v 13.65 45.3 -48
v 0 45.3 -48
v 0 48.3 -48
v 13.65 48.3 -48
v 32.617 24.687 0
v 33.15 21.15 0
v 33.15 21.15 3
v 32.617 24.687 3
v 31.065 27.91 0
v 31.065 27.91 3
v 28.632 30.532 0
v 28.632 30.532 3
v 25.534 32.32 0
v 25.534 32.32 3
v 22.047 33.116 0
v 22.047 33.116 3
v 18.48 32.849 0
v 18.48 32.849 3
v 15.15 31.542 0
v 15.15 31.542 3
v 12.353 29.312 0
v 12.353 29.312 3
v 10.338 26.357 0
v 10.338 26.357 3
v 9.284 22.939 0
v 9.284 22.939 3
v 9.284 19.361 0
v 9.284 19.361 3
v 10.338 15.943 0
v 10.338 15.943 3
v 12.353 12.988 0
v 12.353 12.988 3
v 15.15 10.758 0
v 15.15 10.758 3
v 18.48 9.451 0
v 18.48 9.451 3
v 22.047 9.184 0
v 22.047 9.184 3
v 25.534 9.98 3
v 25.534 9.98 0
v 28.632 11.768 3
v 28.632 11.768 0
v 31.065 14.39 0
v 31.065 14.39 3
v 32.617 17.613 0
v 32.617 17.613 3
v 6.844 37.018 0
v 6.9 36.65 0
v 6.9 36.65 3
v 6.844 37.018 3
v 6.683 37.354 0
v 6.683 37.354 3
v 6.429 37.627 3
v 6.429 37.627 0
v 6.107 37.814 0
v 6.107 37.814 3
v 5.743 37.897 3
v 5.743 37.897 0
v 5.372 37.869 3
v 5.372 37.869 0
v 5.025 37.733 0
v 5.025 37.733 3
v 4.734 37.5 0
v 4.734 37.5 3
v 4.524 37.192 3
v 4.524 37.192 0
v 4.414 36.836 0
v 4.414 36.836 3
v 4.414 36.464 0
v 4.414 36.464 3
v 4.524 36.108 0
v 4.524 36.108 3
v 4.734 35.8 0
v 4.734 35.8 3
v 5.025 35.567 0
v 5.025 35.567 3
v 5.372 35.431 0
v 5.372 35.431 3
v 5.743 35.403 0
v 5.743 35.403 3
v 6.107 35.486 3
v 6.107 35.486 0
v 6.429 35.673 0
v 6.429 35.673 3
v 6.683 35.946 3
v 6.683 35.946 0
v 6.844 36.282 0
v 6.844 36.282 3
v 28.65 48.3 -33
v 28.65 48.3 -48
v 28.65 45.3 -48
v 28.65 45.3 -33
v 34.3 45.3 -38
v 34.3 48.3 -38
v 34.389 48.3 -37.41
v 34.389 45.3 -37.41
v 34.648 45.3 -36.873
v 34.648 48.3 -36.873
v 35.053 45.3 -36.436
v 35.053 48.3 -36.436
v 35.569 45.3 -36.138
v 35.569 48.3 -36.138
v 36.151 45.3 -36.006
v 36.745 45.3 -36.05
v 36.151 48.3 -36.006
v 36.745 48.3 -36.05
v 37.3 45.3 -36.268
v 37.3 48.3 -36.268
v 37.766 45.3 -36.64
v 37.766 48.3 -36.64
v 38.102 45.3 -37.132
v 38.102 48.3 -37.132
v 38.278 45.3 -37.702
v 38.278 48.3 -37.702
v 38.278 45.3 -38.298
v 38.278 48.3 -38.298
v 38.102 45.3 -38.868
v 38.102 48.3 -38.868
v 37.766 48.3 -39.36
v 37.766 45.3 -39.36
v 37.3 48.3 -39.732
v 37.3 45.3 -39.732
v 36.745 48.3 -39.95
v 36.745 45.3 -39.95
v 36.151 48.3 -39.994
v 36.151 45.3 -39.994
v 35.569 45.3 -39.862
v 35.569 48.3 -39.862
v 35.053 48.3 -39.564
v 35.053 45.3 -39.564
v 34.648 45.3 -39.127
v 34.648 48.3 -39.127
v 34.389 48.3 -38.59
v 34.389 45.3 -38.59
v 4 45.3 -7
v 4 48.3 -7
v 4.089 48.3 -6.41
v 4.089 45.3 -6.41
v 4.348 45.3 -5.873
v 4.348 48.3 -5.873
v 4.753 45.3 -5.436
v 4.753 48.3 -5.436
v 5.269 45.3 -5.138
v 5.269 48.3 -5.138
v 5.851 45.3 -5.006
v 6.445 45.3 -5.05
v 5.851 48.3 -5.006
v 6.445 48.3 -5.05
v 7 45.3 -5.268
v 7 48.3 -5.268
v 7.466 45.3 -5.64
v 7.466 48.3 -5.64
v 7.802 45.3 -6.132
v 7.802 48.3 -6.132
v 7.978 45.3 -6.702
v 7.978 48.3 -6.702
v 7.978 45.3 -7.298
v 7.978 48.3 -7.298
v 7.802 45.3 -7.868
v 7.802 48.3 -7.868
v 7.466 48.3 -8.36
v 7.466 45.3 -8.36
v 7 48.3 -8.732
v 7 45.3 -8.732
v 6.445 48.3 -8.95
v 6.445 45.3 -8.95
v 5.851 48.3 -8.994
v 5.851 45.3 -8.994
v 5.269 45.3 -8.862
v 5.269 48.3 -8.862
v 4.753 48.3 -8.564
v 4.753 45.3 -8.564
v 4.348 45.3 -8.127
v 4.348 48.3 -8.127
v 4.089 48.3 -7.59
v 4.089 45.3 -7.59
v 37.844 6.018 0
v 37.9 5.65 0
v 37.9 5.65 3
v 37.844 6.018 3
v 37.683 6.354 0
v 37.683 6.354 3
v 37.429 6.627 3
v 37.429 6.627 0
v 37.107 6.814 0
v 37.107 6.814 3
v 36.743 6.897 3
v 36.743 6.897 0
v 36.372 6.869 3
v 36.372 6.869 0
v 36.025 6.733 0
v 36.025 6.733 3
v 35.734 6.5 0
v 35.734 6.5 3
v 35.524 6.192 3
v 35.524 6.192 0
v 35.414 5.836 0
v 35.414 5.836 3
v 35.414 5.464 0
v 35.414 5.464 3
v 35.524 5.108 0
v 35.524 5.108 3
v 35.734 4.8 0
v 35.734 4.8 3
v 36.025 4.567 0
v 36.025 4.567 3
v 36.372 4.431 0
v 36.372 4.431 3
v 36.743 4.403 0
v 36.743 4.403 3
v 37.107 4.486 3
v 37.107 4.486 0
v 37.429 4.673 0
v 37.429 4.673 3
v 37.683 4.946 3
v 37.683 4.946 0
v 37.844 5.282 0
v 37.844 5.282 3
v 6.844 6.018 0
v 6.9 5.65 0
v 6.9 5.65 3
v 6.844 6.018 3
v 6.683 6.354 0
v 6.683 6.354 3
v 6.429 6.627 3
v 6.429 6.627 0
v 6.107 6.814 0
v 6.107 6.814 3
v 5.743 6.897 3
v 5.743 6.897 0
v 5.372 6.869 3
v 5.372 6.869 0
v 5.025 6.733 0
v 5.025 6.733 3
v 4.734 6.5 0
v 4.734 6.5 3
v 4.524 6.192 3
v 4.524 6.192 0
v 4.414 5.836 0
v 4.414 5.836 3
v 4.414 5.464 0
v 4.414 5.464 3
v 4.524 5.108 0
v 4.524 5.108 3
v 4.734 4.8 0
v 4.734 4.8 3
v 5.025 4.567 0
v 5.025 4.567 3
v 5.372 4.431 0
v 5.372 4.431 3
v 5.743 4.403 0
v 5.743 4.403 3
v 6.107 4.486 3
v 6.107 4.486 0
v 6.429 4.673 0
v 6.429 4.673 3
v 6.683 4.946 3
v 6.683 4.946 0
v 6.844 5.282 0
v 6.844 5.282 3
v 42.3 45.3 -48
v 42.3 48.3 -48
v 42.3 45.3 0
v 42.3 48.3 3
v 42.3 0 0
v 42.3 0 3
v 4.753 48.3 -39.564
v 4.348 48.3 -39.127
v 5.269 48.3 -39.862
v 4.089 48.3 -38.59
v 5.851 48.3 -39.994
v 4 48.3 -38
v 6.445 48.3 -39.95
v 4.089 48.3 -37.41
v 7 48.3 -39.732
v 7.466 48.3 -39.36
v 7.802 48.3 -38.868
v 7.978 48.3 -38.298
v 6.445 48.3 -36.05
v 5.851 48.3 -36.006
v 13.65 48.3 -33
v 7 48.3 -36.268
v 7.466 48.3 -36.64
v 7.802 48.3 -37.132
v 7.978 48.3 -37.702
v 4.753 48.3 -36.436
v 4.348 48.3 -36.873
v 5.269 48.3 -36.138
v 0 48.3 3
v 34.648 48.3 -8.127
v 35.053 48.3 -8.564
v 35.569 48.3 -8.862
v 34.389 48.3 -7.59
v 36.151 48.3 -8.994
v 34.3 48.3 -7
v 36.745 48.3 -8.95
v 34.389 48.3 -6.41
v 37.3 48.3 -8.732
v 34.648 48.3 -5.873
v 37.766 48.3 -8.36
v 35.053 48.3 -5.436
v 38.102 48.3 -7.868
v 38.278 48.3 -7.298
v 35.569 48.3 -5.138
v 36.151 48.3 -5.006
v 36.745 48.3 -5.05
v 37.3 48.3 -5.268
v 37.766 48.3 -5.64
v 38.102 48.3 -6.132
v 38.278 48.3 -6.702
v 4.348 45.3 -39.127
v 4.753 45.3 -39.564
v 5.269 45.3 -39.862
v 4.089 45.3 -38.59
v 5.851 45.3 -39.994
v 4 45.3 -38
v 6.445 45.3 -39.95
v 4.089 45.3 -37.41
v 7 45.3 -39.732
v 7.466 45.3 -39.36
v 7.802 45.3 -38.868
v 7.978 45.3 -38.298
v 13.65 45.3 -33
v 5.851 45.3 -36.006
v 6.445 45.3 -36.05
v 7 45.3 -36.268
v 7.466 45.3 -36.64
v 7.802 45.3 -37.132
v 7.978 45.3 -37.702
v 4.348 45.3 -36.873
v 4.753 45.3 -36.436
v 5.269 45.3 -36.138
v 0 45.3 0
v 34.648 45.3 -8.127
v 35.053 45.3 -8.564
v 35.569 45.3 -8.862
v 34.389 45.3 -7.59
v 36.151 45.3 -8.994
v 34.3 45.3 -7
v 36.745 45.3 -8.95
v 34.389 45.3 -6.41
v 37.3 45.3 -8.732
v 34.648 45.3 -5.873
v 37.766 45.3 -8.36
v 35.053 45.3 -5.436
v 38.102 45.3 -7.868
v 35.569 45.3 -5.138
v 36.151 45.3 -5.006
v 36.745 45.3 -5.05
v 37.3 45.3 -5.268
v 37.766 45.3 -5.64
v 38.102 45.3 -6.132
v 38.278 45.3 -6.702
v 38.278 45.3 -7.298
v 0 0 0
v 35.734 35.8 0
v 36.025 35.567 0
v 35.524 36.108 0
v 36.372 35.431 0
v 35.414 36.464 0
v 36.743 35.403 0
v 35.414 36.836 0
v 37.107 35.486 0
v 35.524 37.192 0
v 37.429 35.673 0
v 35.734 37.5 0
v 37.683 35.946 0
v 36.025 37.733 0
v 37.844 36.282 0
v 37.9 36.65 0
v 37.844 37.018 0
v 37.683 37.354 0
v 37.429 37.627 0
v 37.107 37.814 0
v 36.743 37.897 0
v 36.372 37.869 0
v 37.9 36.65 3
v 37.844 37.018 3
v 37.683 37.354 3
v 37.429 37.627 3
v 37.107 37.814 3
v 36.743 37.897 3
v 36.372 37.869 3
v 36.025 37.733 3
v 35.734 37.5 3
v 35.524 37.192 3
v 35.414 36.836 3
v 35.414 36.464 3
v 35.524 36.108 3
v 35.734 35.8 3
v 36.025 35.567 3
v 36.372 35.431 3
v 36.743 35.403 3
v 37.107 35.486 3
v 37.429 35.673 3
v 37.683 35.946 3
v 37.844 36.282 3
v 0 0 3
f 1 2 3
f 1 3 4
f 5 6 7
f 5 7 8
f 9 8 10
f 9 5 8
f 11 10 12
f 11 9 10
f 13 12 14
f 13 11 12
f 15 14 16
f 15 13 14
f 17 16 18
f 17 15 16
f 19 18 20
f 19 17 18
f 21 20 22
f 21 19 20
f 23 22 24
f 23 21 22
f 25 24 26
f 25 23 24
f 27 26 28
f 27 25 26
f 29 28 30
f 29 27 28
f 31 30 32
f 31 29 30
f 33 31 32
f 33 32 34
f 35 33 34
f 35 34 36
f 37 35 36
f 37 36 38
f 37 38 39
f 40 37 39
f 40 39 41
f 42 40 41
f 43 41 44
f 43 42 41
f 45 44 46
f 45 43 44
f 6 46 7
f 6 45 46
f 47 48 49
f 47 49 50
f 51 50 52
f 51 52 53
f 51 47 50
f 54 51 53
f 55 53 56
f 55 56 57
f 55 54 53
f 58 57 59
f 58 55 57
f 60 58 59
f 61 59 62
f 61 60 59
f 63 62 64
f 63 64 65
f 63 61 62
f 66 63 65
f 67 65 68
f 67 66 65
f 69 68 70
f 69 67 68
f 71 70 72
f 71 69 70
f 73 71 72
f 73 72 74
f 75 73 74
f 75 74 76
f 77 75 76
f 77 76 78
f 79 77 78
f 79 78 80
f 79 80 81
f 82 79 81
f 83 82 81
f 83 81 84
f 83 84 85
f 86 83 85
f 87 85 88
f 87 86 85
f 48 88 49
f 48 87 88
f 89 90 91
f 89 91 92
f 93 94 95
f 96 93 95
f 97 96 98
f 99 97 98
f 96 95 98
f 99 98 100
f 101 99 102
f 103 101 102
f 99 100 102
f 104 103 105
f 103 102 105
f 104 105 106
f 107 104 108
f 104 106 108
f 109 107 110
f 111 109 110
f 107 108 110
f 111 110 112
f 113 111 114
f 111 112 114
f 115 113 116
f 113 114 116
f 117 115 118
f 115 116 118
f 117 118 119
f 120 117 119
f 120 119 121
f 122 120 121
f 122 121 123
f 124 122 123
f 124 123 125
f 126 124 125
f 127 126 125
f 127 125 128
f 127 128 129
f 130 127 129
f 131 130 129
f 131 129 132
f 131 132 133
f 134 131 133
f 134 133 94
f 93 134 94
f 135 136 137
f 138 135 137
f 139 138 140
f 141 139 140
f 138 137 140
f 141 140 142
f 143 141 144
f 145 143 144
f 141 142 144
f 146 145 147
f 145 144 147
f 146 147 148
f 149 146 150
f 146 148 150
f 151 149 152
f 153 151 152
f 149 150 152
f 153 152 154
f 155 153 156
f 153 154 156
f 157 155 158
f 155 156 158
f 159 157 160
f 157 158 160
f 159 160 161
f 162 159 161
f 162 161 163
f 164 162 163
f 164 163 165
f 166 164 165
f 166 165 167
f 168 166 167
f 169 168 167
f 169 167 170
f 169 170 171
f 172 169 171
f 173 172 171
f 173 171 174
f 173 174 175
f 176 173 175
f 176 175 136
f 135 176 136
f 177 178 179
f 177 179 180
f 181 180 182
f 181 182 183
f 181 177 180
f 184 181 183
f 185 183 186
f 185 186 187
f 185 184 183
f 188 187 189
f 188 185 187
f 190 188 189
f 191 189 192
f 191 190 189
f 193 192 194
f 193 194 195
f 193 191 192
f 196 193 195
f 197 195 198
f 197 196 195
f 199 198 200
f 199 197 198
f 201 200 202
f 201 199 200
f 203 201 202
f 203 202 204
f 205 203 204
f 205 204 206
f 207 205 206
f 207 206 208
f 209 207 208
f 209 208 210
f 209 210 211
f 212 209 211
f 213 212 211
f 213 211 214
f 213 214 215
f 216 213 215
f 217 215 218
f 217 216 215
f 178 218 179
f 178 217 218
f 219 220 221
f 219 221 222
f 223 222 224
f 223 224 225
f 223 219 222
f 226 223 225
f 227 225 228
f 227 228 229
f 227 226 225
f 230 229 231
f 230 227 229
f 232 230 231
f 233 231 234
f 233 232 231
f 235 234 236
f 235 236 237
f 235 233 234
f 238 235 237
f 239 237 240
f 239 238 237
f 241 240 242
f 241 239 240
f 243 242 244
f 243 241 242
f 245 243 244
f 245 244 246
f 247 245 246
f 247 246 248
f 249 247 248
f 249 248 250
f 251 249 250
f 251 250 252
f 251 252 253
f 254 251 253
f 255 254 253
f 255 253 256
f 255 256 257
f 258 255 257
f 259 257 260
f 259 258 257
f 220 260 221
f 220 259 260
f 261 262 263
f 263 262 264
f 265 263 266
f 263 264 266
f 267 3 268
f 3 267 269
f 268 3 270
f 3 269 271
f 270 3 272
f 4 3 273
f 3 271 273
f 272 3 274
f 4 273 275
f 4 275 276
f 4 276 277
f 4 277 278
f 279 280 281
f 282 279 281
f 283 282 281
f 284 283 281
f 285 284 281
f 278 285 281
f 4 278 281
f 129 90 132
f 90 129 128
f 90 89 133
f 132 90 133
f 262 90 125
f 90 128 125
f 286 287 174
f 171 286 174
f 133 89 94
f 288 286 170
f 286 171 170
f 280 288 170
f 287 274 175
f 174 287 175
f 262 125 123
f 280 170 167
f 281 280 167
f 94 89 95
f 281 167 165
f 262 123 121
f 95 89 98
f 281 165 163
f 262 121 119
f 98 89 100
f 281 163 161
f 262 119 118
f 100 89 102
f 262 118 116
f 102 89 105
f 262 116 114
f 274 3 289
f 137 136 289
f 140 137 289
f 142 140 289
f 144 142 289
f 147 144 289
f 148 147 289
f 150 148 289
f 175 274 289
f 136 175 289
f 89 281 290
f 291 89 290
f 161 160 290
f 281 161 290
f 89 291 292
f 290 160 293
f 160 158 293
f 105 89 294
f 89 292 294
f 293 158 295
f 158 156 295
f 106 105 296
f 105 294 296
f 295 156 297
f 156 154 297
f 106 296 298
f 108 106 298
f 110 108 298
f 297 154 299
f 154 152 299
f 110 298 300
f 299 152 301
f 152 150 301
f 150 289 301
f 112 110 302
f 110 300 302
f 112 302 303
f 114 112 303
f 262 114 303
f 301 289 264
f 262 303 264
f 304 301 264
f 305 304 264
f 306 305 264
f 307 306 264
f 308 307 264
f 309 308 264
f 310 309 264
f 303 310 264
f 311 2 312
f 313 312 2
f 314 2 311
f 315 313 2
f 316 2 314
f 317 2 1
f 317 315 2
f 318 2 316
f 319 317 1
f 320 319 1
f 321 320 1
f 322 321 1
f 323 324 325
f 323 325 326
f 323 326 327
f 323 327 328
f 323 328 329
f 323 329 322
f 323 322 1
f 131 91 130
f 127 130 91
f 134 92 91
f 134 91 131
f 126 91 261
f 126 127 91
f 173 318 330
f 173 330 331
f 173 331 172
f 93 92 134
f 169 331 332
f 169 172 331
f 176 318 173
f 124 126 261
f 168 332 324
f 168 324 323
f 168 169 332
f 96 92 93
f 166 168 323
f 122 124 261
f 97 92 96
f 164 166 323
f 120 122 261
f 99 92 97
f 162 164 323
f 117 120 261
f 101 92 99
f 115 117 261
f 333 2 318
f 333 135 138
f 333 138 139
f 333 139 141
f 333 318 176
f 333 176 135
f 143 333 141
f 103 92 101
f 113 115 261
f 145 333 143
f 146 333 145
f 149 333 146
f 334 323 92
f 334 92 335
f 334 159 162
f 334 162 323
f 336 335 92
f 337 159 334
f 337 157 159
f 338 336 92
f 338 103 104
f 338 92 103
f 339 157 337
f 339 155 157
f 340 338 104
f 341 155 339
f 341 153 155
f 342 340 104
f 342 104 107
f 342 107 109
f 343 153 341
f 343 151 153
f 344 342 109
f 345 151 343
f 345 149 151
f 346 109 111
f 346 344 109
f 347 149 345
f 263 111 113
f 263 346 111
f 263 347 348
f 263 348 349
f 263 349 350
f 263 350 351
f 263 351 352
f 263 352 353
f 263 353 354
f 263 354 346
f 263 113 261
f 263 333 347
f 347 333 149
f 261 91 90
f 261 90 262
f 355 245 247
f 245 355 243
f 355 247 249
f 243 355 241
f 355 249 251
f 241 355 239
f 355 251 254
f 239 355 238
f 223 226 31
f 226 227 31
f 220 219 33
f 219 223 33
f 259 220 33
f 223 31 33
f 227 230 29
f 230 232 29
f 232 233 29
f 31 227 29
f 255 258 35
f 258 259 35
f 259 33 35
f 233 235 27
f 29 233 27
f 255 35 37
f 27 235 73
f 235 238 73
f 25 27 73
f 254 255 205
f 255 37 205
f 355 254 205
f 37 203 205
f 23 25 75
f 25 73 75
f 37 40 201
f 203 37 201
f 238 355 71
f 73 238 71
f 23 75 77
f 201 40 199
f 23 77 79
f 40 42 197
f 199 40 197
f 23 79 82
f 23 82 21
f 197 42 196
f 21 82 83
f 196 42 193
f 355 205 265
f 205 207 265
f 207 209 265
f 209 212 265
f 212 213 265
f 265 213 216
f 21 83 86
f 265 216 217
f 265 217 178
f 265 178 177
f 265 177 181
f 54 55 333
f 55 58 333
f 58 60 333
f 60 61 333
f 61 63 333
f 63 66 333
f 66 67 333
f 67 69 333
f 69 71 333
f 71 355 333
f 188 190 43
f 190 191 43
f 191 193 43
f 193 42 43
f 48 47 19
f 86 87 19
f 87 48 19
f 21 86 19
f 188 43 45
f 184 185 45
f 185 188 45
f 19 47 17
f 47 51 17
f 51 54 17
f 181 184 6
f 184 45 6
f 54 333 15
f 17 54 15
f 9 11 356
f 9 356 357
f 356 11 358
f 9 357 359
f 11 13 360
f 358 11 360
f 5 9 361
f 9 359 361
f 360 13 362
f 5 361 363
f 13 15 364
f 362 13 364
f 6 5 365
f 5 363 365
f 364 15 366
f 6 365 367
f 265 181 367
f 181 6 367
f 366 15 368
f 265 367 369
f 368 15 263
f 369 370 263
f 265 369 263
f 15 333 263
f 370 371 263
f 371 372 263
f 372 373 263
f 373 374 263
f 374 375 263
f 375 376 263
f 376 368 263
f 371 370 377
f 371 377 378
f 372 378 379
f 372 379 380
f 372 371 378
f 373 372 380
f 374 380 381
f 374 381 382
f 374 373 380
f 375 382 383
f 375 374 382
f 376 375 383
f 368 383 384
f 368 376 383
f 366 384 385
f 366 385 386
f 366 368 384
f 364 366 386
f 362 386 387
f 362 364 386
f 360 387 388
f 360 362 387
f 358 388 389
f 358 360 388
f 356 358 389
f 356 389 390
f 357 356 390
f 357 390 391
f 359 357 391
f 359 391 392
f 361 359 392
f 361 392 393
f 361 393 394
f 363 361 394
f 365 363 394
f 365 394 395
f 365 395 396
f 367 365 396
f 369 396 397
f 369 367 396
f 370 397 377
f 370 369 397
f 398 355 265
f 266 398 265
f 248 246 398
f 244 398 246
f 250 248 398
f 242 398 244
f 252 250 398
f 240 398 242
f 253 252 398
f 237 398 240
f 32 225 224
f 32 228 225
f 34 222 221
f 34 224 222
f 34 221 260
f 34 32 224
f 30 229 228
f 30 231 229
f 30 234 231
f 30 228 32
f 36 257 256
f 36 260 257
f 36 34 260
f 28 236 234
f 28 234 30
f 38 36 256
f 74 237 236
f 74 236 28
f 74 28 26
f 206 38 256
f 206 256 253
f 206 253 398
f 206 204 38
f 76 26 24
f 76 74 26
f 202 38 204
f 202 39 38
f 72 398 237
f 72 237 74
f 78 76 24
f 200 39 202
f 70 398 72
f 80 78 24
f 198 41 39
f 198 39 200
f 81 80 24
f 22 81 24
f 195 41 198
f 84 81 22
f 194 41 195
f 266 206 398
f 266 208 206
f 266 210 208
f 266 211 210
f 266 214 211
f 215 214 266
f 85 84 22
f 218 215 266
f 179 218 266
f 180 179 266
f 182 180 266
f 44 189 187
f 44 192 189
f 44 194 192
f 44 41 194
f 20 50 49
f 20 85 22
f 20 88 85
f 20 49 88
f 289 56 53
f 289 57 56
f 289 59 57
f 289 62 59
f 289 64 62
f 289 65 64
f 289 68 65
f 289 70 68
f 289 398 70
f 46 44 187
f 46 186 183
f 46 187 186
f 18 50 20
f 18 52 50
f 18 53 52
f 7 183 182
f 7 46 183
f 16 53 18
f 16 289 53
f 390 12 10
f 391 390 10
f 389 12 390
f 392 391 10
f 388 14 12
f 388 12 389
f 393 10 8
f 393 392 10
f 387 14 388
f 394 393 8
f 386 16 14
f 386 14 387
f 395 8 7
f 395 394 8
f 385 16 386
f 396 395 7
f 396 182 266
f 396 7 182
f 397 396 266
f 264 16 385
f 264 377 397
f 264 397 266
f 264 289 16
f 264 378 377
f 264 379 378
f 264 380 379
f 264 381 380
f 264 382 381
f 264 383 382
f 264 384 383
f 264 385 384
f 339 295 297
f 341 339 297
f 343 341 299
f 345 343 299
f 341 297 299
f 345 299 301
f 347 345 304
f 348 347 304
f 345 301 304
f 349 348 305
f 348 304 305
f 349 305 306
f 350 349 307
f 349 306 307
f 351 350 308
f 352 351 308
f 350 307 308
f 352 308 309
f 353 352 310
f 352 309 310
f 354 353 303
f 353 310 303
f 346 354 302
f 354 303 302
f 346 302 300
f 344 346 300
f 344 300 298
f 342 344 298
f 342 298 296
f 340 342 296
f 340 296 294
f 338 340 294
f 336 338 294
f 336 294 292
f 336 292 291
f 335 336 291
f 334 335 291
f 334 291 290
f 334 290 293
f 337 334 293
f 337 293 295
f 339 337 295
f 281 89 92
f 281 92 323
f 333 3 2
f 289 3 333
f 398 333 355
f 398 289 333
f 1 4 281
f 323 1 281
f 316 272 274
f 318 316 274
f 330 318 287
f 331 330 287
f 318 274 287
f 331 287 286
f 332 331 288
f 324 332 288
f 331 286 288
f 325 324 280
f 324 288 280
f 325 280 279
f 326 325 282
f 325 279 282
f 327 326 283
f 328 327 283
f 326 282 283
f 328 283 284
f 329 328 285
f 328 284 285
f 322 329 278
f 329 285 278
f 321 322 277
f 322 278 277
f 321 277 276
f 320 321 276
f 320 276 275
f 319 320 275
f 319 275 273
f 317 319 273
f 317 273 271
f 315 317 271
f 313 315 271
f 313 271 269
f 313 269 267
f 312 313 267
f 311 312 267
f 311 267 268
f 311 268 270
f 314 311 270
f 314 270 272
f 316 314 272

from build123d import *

# Parameters (mm, degrees)
SKETCH_R     = 1.25
SKETCH_R_2   = 12
PAD_DEPTH    = 3
SKETCH001_W  = 42.3
SKETCH001_H  = 3
PAD001_DEPTH = 48
SKETCH002_R  = 2
SKETCH002_W  = 15
SKETCH002_H  = 15
POCKET_DEPTH = 48.301


with BuildPart() as part:
    # Sketch → Pad (new body)
    with BuildSketch(Plane.XY):
        Polygon((0, 0), (42.3, 0), (42.3, 42.3), (42.3, 48.3), (0, 48.3), (0, 42.3), align=None)
        with Locations((5.65, 36.65)):
            Circle(SKETCH_R, mode=Mode.SUBTRACT)
        with Locations((36.65, 36.65)):
            Circle(SKETCH_R, mode=Mode.SUBTRACT)
        with Locations((5.65, 5.65)):
            Circle(SKETCH_R, mode=Mode.SUBTRACT)
        with Locations((36.65, 5.65)):
            Circle(SKETCH_R, mode=Mode.SUBTRACT)
        with Locations((21.15, 21.15)):
            Circle(SKETCH_R_2, mode=Mode.SUBTRACT)
    extrude(amount=PAD_DEPTH)

    # Sketch001 → Pad001 (new body)
    with BuildSketch(Plane(origin=(0, 0, 0), x_dir=(1, 0, 0), z_dir=(0, 0, -1))):
        with Locations((21.15, -46.8)):
            Rectangle(SKETCH001_W, SKETCH001_H)
    extrude(amount=PAD001_DEPTH)

    # Sketch002 → Pocket (cut, through all)
    with BuildSketch(Plane(origin=(0, 48.3, 0), x_dir=(-1, 0, 0), z_dir=(0, 1, 0))):
        with Locations((-36.3, -7)):
            Circle(SKETCH002_R)
        with Locations((-6, -7)):
            Circle(SKETCH002_R)
        with Locations((-36.3, -38)):
            Circle(SKETCH002_R)
        with Locations((-6, -38)):
            Circle(SKETCH002_R)
        with Locations((-21.15, -40.5)):
            Rectangle(SKETCH002_W, SKETCH002_H)
    extrude(amount=-POCKET_DEPTH, mode=Mode.SUBTRACT)


solid = part.part
